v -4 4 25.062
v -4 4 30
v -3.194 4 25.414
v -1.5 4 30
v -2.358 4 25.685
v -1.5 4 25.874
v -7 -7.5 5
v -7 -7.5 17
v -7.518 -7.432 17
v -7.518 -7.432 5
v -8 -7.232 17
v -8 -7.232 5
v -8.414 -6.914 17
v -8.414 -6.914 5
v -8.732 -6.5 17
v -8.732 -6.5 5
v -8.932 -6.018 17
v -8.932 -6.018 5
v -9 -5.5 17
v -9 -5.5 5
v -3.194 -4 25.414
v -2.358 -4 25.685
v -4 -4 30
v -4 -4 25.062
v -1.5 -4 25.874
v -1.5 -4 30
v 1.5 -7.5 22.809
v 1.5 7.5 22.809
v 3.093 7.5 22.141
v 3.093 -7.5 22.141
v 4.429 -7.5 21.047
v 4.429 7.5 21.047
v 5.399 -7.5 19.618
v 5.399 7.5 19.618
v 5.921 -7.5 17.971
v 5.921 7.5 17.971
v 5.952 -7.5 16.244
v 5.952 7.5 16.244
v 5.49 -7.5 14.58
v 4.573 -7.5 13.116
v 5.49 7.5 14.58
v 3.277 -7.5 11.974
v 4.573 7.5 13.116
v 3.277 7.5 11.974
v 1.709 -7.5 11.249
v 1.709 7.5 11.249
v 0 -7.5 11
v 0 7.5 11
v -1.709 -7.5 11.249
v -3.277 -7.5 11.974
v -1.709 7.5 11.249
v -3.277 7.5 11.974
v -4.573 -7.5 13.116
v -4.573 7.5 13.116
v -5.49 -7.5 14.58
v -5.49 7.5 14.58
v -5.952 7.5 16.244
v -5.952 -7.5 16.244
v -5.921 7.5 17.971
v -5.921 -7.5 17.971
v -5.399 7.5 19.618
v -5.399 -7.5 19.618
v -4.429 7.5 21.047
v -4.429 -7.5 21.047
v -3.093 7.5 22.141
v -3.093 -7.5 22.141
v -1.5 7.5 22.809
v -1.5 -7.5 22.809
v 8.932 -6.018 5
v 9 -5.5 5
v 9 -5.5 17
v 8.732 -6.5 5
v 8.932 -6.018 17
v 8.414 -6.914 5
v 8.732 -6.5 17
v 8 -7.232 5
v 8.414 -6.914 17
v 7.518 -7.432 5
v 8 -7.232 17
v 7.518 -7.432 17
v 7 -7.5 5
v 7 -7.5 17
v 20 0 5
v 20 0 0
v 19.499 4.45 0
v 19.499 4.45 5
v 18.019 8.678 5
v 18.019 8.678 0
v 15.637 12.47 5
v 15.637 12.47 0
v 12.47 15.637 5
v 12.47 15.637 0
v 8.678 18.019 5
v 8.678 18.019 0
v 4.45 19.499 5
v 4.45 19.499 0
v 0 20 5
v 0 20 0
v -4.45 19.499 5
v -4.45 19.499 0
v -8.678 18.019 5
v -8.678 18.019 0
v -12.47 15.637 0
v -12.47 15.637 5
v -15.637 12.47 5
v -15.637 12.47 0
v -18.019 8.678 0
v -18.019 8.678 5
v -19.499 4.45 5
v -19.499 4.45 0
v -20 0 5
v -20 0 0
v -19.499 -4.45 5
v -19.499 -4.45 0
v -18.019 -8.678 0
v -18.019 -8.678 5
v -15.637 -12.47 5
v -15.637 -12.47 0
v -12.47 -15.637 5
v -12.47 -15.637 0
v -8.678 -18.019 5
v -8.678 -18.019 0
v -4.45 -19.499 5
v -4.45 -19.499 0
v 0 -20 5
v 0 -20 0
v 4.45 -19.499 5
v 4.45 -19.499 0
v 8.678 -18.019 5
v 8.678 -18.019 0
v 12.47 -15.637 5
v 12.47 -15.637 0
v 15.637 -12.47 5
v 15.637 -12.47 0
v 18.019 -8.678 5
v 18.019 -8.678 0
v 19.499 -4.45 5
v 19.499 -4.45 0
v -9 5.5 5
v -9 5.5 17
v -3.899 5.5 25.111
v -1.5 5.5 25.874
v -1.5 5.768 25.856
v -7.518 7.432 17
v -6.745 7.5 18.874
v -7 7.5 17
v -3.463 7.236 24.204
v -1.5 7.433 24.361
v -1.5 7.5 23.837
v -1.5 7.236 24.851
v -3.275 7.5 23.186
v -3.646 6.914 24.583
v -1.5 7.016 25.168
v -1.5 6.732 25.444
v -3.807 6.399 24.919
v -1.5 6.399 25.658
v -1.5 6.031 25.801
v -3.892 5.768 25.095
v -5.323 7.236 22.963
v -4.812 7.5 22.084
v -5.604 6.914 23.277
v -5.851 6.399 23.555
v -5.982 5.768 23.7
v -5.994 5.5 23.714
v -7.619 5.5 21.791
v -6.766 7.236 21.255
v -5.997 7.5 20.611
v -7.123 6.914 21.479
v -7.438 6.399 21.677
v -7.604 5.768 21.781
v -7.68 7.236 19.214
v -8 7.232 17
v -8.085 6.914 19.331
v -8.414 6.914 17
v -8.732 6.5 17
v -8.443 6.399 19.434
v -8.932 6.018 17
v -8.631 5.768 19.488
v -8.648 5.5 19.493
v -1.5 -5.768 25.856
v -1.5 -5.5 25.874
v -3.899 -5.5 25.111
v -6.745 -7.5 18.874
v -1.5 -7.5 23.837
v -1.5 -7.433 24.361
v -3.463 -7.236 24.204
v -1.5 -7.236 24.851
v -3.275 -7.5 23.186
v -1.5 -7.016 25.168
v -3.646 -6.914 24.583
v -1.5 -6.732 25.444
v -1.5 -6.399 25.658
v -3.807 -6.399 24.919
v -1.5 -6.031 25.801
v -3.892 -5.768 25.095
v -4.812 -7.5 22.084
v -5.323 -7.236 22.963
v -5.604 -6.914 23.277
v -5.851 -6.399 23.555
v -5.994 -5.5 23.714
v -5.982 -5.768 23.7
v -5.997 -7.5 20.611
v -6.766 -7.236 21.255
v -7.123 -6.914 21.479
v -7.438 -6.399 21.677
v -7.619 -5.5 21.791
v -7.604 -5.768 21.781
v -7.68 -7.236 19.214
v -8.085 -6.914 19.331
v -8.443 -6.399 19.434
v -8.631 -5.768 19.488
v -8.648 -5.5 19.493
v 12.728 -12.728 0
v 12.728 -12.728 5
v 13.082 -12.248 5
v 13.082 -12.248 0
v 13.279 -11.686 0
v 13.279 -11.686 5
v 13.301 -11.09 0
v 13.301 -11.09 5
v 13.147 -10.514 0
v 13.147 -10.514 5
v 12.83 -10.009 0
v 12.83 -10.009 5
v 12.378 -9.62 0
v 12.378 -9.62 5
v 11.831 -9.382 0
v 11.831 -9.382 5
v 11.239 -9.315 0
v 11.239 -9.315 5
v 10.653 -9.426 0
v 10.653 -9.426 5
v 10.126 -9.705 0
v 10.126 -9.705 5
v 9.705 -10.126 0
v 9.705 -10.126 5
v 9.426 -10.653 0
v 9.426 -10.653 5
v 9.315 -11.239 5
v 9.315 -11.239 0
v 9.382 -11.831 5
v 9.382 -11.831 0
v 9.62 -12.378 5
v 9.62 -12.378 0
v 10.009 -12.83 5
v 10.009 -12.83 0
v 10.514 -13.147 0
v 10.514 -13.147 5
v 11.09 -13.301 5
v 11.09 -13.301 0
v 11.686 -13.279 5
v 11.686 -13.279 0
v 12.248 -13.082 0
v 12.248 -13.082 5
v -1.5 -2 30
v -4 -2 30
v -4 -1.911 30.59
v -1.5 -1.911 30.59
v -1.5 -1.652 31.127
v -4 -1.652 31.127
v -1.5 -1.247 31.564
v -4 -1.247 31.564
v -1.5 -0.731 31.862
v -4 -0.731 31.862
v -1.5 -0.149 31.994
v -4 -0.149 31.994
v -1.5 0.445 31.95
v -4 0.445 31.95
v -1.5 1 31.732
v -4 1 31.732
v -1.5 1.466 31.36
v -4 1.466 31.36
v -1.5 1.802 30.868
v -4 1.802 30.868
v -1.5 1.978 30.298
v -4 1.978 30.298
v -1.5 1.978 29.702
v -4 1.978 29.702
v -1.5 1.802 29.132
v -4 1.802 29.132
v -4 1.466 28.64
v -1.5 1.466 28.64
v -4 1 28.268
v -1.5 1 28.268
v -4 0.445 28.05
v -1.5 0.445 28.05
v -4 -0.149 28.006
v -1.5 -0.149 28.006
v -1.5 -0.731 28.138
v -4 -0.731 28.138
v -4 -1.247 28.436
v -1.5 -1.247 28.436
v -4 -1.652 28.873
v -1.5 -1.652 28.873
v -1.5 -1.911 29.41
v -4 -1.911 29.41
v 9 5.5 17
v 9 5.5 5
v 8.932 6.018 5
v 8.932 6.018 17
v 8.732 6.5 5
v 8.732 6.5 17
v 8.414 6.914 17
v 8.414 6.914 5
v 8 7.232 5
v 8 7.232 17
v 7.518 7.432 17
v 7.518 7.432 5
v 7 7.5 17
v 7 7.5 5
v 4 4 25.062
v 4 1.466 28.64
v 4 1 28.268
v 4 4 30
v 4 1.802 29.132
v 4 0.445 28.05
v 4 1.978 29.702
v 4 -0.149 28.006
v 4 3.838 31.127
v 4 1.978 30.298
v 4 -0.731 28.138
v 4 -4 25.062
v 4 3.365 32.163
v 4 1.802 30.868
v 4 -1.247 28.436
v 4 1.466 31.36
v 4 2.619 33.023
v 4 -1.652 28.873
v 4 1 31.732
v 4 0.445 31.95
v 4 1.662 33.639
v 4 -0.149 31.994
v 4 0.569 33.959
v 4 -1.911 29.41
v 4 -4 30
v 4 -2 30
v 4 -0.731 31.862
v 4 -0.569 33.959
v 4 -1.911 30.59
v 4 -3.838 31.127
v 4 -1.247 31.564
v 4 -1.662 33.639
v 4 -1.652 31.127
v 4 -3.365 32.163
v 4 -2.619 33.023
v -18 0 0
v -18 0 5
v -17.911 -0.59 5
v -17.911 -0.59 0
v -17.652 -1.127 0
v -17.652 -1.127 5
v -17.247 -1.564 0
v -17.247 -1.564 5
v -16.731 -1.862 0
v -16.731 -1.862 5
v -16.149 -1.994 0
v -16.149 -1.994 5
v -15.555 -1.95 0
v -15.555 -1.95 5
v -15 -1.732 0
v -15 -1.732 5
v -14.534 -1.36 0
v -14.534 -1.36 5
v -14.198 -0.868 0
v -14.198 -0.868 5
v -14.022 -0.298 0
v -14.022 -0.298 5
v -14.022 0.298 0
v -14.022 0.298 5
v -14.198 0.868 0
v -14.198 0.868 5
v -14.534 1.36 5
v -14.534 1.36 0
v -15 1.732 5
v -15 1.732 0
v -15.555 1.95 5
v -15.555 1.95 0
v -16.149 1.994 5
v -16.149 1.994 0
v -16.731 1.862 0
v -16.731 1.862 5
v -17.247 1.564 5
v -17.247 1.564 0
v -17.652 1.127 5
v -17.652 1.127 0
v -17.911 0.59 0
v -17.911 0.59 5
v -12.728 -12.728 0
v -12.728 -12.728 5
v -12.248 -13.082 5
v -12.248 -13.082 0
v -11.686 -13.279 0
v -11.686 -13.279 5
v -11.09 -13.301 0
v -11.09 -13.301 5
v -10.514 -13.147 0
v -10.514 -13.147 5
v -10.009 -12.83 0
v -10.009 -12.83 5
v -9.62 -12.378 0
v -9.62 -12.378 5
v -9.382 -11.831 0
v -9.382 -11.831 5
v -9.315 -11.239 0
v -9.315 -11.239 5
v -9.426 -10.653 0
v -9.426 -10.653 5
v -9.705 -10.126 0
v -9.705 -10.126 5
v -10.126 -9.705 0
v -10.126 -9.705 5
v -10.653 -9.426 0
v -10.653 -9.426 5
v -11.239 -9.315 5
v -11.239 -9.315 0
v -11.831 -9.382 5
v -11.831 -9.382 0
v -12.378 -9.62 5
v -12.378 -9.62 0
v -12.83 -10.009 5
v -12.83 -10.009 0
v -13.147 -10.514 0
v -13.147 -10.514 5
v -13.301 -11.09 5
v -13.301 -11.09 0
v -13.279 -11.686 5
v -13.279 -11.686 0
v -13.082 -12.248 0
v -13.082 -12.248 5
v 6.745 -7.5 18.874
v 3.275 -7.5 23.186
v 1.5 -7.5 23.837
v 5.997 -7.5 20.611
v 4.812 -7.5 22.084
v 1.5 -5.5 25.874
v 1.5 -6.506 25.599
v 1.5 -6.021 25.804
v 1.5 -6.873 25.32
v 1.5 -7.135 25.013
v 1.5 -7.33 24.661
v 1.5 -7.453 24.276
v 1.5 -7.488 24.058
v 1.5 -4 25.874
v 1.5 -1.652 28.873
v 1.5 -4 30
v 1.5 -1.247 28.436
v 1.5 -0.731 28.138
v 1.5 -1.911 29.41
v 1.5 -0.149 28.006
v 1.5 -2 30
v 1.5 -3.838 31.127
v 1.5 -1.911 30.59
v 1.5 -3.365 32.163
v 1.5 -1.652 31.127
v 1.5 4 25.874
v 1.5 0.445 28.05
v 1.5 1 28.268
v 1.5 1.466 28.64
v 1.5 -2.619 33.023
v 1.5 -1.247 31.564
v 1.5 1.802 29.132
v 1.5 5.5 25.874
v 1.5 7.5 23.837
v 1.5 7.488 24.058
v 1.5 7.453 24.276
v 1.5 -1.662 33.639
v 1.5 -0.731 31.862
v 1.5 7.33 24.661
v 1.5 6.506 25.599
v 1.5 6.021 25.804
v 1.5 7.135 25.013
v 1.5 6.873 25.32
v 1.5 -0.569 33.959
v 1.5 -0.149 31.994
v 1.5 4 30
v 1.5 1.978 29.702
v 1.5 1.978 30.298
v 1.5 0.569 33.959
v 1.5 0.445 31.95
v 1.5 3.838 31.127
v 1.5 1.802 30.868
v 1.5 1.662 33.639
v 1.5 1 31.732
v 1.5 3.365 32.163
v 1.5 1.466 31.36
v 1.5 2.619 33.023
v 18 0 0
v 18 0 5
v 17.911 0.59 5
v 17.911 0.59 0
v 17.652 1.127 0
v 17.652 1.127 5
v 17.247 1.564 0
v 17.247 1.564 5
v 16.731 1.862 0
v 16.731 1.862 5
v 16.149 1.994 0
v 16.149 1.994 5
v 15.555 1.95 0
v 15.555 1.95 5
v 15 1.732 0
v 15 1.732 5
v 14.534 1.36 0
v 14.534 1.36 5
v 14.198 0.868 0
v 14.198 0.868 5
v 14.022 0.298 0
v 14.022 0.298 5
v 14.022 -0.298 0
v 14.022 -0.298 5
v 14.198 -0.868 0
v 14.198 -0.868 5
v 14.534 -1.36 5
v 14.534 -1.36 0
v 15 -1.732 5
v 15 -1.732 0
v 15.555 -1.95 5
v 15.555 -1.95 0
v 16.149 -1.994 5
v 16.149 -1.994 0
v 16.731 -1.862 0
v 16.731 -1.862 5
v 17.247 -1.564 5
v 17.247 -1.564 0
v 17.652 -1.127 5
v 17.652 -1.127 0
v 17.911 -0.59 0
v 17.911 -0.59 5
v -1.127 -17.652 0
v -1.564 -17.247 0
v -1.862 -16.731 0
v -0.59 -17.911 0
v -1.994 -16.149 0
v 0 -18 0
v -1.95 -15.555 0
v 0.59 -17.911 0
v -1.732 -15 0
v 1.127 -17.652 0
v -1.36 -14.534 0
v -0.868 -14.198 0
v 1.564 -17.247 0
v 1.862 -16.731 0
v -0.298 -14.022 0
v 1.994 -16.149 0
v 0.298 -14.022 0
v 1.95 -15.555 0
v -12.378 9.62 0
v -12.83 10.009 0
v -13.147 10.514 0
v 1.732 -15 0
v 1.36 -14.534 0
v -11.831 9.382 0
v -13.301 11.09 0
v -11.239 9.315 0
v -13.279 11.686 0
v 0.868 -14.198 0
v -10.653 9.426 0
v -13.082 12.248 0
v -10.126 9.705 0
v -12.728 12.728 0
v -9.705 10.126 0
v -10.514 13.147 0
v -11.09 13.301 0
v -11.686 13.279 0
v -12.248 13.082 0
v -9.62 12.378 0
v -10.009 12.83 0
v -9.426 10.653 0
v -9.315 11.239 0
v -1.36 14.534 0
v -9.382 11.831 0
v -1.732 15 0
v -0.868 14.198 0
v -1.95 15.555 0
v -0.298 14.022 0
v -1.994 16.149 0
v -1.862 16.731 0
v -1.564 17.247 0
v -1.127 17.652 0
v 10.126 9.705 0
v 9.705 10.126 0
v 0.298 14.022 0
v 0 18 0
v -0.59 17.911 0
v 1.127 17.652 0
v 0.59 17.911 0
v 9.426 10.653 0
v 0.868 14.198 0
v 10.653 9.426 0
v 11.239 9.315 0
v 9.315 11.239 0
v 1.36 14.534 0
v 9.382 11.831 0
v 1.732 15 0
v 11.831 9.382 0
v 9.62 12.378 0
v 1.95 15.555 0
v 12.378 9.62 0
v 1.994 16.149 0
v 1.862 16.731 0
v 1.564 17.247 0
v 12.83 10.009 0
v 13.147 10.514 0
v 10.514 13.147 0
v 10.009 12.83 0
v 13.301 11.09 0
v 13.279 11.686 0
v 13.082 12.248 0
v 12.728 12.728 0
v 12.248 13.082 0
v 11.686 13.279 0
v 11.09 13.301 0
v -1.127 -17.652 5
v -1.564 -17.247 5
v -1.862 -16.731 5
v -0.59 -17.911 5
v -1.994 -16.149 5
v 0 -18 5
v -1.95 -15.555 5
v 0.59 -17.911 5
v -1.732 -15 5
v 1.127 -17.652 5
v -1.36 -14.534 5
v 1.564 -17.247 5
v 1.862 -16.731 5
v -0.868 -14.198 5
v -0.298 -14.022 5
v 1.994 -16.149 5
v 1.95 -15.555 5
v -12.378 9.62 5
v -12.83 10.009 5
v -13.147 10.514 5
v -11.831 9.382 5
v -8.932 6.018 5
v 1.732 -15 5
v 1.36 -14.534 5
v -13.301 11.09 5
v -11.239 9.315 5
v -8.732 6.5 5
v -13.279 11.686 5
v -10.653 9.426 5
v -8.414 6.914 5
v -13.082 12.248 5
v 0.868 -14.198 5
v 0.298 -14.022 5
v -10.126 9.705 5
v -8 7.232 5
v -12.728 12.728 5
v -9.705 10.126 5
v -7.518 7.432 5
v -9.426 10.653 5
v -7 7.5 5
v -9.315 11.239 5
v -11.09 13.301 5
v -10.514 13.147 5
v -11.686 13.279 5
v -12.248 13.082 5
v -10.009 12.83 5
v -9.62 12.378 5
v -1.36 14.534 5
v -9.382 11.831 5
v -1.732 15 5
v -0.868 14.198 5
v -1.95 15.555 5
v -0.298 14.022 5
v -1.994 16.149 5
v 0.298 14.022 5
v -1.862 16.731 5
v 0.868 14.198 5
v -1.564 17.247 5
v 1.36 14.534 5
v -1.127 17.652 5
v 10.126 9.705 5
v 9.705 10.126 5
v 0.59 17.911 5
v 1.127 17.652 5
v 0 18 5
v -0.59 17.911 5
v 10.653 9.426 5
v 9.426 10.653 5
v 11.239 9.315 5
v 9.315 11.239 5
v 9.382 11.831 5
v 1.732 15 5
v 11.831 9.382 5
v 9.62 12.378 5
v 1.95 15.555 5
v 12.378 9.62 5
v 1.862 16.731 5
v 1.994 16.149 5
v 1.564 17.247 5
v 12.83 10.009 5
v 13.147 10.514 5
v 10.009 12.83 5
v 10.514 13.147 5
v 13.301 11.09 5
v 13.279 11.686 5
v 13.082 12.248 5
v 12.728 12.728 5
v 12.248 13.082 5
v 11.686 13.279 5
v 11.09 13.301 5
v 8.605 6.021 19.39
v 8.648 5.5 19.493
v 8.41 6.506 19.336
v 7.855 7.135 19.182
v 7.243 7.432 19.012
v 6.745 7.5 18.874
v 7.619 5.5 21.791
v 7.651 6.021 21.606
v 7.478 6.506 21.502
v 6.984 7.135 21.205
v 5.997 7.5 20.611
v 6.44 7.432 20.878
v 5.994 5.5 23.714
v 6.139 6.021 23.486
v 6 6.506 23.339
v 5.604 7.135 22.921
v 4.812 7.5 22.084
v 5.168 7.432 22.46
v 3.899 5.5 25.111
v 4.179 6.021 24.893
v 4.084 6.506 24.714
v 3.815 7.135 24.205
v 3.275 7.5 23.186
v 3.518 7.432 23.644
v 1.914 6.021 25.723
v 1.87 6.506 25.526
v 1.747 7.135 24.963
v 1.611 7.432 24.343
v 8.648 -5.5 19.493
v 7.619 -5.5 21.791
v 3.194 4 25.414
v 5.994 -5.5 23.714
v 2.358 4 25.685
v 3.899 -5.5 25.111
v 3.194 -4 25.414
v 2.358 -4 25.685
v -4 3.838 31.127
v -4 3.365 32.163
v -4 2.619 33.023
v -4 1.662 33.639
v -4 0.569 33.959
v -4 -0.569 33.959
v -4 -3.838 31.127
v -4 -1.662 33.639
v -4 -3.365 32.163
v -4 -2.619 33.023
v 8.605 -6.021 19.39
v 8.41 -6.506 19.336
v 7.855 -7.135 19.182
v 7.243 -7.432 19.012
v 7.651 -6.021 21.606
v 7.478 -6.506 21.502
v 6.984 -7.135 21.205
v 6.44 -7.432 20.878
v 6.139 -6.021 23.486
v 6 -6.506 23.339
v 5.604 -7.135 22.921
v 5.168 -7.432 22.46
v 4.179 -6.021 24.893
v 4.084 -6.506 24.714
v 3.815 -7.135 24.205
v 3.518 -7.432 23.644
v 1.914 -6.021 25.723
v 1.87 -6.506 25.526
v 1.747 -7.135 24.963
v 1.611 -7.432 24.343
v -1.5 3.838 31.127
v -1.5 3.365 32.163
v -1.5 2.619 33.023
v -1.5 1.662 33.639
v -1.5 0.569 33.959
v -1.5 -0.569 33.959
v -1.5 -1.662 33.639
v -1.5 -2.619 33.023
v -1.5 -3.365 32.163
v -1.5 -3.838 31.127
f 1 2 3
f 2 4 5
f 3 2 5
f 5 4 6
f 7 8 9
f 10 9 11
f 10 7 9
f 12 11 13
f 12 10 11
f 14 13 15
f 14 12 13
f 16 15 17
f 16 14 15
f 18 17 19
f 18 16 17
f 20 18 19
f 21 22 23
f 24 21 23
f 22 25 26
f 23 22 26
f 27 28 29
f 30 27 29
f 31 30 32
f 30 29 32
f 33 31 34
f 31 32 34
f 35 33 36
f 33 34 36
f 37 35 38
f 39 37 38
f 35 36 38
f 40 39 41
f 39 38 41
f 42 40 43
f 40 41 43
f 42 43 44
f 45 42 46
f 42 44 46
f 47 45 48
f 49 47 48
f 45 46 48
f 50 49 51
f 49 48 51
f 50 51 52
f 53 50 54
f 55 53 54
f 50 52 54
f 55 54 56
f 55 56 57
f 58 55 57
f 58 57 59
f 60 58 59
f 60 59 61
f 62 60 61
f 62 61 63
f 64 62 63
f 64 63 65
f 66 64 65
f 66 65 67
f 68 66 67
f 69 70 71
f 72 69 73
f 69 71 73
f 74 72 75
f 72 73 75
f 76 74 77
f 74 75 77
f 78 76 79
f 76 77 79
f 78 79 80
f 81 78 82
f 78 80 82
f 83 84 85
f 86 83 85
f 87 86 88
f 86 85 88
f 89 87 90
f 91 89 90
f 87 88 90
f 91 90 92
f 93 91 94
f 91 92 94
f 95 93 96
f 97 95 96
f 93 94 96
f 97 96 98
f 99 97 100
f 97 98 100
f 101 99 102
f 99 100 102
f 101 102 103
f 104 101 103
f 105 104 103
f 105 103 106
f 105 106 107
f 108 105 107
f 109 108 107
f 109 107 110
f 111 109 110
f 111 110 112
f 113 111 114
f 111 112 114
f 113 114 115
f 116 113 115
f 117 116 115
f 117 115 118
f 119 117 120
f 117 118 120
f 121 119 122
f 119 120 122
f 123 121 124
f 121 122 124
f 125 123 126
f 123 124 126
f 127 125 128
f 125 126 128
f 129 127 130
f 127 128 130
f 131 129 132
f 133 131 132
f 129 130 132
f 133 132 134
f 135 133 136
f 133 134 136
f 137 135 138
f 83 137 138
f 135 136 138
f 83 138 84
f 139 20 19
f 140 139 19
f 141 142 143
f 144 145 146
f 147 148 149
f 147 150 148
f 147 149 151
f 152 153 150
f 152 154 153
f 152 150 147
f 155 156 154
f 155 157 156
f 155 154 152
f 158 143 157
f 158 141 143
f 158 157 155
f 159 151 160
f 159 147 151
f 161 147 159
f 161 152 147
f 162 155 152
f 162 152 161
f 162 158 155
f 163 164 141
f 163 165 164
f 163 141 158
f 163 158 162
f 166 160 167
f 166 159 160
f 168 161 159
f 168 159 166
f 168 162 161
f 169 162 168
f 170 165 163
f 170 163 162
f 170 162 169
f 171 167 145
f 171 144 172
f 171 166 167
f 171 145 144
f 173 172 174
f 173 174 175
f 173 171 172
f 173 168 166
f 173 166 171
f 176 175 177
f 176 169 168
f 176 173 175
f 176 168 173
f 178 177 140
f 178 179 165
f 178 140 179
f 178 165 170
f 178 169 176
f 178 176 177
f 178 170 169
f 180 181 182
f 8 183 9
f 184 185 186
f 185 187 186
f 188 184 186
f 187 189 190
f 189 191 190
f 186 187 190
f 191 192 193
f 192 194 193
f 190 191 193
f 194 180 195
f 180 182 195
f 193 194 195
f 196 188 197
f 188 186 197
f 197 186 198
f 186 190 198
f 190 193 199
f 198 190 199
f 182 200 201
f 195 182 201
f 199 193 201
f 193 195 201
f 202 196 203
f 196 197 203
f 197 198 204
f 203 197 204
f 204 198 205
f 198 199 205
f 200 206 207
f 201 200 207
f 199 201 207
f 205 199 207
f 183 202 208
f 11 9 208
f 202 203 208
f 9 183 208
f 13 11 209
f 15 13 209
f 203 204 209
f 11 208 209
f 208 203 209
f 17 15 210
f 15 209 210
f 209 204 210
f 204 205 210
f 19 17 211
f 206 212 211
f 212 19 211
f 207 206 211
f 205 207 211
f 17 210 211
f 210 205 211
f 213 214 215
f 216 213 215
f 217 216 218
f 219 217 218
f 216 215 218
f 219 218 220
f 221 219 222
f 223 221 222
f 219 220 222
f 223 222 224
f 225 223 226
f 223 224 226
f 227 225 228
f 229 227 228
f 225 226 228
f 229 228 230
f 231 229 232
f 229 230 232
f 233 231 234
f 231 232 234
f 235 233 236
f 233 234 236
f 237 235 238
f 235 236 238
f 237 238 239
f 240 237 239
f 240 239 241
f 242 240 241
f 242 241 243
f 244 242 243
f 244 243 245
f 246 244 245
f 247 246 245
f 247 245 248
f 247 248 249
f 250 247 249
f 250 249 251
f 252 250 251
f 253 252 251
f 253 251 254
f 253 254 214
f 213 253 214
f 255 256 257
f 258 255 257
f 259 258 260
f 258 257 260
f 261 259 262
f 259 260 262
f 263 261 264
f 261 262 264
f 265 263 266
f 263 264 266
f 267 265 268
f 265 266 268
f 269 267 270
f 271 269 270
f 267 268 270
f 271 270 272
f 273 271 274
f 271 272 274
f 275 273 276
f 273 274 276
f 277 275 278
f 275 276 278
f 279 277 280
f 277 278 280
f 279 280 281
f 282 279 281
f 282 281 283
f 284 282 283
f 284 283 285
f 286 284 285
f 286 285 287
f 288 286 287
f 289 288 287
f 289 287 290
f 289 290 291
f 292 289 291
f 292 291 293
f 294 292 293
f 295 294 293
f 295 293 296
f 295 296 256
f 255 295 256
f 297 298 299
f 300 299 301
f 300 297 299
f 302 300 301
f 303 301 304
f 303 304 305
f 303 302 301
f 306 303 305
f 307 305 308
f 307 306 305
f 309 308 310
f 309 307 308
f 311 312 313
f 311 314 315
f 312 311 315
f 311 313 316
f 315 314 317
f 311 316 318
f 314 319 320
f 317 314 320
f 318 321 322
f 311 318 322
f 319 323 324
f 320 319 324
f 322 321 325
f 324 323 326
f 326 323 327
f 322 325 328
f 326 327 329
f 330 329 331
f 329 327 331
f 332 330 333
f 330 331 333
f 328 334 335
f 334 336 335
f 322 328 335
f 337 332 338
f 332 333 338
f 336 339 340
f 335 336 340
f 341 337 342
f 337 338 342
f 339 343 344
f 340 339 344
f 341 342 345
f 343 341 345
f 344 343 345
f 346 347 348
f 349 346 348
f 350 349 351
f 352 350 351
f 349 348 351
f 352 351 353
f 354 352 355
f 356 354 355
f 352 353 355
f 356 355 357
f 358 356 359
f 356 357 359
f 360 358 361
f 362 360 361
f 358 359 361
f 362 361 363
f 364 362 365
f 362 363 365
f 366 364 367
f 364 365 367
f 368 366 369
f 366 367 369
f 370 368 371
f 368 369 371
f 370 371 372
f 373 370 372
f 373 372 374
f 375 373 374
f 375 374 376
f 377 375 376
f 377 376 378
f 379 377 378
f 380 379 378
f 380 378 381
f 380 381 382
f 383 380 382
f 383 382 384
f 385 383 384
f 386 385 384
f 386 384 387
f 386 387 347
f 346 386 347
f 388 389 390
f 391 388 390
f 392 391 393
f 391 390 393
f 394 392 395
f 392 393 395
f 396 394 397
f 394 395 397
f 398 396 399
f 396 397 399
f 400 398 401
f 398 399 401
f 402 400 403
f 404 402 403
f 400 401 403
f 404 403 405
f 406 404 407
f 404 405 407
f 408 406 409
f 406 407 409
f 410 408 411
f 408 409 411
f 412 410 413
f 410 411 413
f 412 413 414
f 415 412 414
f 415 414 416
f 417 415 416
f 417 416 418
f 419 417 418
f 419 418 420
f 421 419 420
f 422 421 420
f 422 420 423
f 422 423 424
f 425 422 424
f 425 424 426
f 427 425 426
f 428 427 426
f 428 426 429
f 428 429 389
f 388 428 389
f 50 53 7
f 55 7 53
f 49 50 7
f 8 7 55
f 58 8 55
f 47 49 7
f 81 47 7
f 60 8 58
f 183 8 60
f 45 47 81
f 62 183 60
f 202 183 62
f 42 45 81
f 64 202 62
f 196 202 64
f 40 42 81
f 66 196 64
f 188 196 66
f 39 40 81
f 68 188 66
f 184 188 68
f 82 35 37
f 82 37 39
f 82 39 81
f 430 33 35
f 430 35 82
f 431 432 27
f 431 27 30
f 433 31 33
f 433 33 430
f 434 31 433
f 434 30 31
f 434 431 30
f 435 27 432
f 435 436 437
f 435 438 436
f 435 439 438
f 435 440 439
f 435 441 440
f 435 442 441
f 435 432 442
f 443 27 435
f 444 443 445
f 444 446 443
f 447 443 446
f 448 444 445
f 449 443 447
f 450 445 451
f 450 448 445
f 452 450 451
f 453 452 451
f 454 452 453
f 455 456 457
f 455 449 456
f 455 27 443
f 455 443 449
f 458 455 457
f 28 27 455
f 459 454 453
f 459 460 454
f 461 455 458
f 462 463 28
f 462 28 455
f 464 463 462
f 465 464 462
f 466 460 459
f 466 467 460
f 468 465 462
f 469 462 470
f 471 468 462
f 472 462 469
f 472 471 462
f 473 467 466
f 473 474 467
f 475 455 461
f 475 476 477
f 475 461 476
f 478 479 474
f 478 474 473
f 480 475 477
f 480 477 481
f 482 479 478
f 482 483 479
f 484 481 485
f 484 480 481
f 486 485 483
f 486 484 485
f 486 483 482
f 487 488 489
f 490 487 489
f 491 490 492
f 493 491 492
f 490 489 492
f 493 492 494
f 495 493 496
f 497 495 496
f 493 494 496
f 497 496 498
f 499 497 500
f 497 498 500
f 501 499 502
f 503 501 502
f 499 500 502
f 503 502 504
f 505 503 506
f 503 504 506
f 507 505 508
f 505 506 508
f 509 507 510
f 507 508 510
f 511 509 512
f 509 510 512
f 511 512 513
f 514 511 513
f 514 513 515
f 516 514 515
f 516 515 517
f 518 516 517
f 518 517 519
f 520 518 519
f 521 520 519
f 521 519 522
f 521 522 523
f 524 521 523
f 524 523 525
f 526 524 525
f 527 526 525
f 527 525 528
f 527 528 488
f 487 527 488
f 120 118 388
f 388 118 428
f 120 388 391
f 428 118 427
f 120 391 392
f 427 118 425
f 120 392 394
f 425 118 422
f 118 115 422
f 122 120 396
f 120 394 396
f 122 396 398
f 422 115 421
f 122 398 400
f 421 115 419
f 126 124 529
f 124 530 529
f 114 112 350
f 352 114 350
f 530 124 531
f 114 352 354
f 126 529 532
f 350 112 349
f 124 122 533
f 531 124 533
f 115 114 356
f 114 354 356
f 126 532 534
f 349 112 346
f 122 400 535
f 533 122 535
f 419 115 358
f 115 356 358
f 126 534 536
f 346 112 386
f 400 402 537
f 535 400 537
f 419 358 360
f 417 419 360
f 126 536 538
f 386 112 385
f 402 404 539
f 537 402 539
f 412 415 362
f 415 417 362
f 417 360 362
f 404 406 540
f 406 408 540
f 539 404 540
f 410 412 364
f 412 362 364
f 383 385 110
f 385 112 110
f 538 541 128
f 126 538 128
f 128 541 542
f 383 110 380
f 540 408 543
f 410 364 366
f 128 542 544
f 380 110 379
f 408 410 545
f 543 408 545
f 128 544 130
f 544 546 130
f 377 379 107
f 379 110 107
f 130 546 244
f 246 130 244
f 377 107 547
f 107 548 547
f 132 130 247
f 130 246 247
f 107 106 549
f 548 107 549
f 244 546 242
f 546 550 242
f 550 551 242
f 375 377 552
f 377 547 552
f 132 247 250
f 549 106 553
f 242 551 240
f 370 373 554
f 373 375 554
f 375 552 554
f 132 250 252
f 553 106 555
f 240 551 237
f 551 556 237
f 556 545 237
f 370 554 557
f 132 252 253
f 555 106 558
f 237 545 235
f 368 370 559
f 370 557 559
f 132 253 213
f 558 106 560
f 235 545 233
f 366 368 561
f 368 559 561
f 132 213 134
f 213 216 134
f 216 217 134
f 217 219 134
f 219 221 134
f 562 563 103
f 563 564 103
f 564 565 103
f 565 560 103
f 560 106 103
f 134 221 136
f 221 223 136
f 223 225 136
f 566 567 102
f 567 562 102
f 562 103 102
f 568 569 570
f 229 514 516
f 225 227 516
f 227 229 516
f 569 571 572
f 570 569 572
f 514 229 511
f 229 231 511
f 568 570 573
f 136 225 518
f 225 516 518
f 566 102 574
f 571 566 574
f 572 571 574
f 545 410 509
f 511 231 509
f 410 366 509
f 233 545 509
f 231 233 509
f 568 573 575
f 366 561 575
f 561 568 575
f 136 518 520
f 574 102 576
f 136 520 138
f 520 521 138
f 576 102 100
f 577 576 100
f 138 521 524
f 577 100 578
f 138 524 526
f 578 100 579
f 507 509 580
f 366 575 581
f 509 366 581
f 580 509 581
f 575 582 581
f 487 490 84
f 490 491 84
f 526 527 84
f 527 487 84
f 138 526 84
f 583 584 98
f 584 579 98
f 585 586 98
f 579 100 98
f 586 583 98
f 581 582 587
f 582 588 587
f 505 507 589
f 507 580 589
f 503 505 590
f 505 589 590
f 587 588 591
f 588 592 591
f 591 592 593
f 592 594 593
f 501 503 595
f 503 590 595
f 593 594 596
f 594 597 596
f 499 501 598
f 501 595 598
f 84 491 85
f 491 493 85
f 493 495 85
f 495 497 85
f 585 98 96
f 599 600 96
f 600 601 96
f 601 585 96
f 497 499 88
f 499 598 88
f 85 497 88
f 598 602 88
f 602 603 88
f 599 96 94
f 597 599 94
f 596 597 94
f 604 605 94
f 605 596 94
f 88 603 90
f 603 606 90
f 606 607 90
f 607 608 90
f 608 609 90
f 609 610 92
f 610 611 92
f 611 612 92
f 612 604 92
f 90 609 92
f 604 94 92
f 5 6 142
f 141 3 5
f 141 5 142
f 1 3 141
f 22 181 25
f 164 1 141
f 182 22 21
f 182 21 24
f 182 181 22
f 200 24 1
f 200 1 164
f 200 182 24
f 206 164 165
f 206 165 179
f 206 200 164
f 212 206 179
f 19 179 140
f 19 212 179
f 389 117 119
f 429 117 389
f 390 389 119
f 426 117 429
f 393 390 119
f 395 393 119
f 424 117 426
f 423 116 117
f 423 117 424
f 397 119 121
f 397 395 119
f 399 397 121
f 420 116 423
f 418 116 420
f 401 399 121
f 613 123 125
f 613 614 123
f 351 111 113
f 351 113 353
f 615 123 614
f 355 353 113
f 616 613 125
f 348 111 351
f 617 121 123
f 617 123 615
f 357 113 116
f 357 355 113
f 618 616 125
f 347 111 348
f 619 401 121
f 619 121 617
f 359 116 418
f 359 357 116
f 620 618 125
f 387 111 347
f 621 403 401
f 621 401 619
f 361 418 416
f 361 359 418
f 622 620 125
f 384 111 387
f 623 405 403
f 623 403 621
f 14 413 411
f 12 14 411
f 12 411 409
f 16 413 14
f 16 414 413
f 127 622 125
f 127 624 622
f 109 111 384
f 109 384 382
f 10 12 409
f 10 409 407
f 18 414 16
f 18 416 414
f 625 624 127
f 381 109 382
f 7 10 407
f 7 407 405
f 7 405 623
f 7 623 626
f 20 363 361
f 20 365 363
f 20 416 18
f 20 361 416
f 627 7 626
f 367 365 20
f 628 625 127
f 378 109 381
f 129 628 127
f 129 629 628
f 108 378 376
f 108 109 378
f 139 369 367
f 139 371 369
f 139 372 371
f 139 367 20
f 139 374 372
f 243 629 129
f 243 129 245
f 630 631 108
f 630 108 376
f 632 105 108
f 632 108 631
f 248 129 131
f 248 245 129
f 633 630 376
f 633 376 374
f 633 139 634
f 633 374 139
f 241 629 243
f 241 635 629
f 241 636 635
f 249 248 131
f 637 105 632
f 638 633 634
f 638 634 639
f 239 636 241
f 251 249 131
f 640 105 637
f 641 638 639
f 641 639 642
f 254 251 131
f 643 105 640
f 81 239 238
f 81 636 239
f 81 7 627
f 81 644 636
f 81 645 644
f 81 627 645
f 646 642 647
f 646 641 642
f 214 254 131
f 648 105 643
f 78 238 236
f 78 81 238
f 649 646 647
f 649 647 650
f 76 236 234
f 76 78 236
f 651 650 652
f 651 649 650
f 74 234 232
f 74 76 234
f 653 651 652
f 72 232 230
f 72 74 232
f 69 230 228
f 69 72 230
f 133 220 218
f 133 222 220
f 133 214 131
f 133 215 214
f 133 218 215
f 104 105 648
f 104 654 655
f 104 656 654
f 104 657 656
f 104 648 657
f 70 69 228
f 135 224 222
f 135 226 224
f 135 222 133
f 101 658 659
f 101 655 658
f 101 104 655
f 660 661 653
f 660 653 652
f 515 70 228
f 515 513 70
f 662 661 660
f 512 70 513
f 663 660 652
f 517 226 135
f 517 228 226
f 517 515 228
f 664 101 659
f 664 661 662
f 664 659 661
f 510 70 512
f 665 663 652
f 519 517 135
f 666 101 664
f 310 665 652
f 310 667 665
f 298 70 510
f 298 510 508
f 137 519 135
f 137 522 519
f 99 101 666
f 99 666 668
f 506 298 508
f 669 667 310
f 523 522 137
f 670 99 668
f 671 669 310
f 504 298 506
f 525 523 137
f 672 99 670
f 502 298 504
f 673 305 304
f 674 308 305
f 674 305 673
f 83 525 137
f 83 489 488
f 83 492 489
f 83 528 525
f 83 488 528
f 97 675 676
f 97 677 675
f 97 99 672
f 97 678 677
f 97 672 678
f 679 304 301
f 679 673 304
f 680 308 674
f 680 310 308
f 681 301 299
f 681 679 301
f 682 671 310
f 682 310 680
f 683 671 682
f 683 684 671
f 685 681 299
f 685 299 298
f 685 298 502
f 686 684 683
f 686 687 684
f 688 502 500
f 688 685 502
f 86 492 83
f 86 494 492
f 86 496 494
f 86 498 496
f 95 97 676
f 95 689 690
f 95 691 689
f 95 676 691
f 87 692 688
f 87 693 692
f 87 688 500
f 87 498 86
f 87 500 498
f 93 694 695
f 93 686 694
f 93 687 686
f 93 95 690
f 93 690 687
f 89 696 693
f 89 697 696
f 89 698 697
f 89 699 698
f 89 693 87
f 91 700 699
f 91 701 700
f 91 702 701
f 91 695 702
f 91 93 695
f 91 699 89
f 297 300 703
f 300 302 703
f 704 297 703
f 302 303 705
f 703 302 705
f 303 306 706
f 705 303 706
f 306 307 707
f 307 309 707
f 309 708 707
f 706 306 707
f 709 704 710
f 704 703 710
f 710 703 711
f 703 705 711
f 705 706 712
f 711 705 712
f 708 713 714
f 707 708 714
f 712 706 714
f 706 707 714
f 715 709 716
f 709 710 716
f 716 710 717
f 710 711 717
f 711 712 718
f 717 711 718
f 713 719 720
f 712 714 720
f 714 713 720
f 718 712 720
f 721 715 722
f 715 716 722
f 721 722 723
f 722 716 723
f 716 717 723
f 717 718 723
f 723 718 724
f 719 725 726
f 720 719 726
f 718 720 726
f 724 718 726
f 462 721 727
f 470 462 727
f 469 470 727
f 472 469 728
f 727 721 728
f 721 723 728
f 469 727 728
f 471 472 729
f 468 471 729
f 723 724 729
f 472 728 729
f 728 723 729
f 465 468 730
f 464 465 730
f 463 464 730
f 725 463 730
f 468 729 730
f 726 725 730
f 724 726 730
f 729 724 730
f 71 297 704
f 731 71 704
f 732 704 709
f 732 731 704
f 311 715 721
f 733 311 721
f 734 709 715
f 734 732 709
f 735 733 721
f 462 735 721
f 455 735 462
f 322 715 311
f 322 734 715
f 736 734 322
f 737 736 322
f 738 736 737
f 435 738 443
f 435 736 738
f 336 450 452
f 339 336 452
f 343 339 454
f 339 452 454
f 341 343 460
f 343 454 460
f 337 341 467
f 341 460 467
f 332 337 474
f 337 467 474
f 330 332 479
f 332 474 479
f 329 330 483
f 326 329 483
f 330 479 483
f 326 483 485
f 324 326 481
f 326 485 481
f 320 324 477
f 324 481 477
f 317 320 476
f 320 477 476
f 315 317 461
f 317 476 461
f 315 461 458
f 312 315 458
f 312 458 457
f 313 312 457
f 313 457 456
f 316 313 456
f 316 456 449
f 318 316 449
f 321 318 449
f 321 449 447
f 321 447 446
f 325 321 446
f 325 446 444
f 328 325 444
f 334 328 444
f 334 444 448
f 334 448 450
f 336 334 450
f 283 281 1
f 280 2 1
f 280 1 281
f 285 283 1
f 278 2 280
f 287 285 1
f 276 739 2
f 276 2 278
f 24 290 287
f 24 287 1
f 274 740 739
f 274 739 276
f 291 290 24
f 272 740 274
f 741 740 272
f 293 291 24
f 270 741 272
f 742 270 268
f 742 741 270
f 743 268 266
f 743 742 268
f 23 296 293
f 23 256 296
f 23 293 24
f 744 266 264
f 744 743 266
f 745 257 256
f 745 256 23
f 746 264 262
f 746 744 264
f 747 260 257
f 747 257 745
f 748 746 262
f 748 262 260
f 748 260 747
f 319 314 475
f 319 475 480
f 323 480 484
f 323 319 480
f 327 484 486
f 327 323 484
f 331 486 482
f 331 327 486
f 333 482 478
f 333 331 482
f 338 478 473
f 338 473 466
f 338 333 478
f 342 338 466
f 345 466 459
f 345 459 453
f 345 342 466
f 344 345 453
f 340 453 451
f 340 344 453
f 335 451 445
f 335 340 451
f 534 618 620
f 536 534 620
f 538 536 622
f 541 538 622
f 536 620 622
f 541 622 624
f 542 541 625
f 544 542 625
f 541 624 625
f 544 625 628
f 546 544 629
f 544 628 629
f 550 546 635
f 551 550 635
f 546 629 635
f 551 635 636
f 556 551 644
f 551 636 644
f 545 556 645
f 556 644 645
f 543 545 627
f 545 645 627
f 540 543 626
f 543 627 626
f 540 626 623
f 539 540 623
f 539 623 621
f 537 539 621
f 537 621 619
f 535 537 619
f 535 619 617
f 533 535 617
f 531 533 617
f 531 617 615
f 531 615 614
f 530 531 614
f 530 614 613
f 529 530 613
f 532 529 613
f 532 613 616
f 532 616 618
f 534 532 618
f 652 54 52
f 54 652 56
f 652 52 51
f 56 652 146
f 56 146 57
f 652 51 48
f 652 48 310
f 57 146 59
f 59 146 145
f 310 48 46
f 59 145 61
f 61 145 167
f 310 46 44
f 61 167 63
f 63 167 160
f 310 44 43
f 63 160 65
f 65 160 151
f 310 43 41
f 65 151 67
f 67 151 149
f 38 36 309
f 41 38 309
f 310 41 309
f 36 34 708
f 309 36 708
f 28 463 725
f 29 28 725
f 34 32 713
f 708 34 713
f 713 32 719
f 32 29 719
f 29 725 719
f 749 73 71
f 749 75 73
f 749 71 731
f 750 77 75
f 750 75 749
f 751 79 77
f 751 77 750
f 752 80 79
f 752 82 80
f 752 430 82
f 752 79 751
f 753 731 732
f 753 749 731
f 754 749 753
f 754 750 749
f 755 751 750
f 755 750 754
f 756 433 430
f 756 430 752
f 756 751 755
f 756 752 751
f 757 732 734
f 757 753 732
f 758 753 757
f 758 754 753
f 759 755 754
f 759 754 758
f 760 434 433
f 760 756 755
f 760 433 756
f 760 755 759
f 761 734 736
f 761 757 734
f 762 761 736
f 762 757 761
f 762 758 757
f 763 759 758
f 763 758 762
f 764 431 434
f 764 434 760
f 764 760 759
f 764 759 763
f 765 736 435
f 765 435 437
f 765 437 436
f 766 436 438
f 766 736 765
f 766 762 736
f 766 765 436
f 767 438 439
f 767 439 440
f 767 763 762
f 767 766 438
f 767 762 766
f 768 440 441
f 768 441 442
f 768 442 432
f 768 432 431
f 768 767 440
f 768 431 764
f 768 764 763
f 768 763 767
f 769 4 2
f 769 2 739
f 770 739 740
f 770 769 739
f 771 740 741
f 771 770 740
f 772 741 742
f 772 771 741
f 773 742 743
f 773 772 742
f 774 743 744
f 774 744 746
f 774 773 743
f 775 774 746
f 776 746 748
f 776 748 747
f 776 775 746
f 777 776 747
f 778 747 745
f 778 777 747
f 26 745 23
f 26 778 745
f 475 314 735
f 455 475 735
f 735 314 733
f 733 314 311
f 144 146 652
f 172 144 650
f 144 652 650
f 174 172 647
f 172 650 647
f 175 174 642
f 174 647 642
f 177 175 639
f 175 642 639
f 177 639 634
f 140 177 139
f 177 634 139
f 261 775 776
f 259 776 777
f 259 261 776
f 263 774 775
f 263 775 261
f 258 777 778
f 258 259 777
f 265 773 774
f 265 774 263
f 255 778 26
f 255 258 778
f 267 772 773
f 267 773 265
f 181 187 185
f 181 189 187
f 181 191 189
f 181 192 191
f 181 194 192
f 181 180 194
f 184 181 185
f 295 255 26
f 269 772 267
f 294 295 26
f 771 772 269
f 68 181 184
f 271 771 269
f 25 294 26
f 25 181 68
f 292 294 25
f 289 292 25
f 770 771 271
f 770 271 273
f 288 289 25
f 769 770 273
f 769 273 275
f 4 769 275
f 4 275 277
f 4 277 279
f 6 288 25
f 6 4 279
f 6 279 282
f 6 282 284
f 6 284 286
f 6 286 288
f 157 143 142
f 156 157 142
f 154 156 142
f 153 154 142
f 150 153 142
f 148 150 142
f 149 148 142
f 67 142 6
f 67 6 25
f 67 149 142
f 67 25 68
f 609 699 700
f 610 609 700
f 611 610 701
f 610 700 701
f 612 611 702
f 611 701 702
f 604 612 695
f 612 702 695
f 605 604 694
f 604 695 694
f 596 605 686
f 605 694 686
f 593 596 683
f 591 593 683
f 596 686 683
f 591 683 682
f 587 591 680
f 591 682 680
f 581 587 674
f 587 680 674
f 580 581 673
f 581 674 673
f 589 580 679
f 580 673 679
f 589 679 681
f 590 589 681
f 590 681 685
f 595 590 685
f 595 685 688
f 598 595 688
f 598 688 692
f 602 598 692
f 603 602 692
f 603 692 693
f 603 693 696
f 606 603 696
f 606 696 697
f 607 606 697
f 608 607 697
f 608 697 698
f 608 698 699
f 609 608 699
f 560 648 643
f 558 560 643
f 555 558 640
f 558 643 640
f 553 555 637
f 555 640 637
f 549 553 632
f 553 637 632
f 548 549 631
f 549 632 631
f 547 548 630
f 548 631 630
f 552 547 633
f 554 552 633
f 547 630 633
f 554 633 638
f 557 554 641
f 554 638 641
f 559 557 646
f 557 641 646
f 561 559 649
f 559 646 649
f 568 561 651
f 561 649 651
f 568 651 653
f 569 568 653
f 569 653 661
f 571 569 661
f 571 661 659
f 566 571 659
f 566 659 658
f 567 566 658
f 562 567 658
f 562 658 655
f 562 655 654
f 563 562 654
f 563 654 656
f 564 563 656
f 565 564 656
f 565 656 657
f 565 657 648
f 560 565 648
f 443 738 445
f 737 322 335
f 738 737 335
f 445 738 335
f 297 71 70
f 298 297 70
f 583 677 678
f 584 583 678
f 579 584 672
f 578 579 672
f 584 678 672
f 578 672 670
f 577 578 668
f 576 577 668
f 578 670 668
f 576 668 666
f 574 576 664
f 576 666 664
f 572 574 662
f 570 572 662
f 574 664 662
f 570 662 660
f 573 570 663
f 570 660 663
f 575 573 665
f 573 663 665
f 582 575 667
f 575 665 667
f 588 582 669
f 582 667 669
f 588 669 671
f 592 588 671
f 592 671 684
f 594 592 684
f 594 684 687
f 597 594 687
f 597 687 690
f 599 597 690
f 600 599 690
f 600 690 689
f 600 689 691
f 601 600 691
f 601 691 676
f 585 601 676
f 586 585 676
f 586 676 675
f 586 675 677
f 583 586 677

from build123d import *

# Parameters (mm, degrees)
SKETCH_R           = 20
PAD_DEPTH          = 5
PAD001_DEPTH       = 7.5
PAD002_DEPTH       = 4
SKETCH003_R        = 2
POCKET_DEPTH       = 24.001
POCKET001_DEPTH    = 27.501
SKETCH005_R        = 2
POCKET002_DEPTH    = 137.001
POLARPATTERN_COUNT = 8
FILLET_R           = 2


with BuildPart() as part:
    # Sketch → Pad (new body)
    with BuildSketch(Plane.XY):
        Circle(SKETCH_R)
    extrude(amount=PAD_DEPTH)

    # Sketch001 → Pad001 (join, symmetric)
    with BuildSketch(Plane.XZ):
        with BuildLine():
            ThreePointArc((9, 17), (0, 26), (-9, 17))
            Line((-9, 5), (-9, 17))
            Line((9, 5), (-9, 5))
            Line((9, 17), (9, 5))
        make_face()
    extrude(amount=PAD001_DEPTH, both=True)

    # Sketch002 → Pad002 (join, symmetric)
    with BuildSketch(Plane.YZ):
        with BuildLine():
            Line((-4, 14), (-4, 30))
            ThreePointArc((4, 30), (0, 34), (-4, 30))
            Line((4, 30), (4, 14))
            Line((4, 14), (-4, 14))
        make_face()
    extrude(amount=PAD002_DEPTH, both=True)

    # Sketch003 (on Face9 of Pad002) → Pocket (cut, through all)
    with BuildSketch(Plane(origin=(-4, 0, 0), x_dir=(0, -1, 0), z_dir=(-1, 0, 0))):
        with Locations((0, 30)):
            Circle(SKETCH003_R)
    extrude(amount=-POCKET_DEPTH, mode=Mode.SUBTRACT)

    # Sketch004 (on Face7 of Pocket) → Pocket001 (cut, through all)
    with BuildSketch(Plane(origin=(0, 7.5, 0), x_dir=(-1, 0, 0), z_dir=(0, 1, 0))):
        with BuildLine():
            ThreePointArc((-1.5, 22.809475), (0, 11), (1.5, 22.809475))
            Line((1.5, 37.2), (1.5, 22.809475))
            Line((-1.5, 37.2), (1.5, 37.2))
            Line((-1.5, 22.809475), (-1.5, 37.2))
        make_face()
    extrude(amount=-POCKET001_DEPTH, mode=Mode.SUBTRACT)

    # Sketch005 (on Face3 of Pocket001) → Pocket002 (cut, through all)
    with BuildSketch(Plane.XY.offset(5)):
        with Locations((16, 0)):
            Circle(SKETCH005_R)
    pocket002 = extrude(amount=-POCKET002_DEPTH, mode=Mode.SUBTRACT)

    # PolarPattern: Pocket002 ×8 about axis
    polarpattern_axis = Axis((0, 0, 5), (0, 0, 1))
    for i in range(1, POLARPATTERN_COUNT):
        add(pocket002.rotate(polarpattern_axis, i * 360 / POLARPATTERN_COUNT), mode=Mode.SUBTRACT)

    # Fillet
    fillet_edges = [part.edges().sort_by_distance(p)[0] for p in [
        (-6.873864, -7.5, 22.809475),
        (6.873864, -7.5, 22.809475),
        (6.873864, 7.5, 22.809475),
        (-6.873864, 7.5, 22.809475),
    ]]
    fillet(fillet_edges, radius=FILLET_R)


solid = part.part
